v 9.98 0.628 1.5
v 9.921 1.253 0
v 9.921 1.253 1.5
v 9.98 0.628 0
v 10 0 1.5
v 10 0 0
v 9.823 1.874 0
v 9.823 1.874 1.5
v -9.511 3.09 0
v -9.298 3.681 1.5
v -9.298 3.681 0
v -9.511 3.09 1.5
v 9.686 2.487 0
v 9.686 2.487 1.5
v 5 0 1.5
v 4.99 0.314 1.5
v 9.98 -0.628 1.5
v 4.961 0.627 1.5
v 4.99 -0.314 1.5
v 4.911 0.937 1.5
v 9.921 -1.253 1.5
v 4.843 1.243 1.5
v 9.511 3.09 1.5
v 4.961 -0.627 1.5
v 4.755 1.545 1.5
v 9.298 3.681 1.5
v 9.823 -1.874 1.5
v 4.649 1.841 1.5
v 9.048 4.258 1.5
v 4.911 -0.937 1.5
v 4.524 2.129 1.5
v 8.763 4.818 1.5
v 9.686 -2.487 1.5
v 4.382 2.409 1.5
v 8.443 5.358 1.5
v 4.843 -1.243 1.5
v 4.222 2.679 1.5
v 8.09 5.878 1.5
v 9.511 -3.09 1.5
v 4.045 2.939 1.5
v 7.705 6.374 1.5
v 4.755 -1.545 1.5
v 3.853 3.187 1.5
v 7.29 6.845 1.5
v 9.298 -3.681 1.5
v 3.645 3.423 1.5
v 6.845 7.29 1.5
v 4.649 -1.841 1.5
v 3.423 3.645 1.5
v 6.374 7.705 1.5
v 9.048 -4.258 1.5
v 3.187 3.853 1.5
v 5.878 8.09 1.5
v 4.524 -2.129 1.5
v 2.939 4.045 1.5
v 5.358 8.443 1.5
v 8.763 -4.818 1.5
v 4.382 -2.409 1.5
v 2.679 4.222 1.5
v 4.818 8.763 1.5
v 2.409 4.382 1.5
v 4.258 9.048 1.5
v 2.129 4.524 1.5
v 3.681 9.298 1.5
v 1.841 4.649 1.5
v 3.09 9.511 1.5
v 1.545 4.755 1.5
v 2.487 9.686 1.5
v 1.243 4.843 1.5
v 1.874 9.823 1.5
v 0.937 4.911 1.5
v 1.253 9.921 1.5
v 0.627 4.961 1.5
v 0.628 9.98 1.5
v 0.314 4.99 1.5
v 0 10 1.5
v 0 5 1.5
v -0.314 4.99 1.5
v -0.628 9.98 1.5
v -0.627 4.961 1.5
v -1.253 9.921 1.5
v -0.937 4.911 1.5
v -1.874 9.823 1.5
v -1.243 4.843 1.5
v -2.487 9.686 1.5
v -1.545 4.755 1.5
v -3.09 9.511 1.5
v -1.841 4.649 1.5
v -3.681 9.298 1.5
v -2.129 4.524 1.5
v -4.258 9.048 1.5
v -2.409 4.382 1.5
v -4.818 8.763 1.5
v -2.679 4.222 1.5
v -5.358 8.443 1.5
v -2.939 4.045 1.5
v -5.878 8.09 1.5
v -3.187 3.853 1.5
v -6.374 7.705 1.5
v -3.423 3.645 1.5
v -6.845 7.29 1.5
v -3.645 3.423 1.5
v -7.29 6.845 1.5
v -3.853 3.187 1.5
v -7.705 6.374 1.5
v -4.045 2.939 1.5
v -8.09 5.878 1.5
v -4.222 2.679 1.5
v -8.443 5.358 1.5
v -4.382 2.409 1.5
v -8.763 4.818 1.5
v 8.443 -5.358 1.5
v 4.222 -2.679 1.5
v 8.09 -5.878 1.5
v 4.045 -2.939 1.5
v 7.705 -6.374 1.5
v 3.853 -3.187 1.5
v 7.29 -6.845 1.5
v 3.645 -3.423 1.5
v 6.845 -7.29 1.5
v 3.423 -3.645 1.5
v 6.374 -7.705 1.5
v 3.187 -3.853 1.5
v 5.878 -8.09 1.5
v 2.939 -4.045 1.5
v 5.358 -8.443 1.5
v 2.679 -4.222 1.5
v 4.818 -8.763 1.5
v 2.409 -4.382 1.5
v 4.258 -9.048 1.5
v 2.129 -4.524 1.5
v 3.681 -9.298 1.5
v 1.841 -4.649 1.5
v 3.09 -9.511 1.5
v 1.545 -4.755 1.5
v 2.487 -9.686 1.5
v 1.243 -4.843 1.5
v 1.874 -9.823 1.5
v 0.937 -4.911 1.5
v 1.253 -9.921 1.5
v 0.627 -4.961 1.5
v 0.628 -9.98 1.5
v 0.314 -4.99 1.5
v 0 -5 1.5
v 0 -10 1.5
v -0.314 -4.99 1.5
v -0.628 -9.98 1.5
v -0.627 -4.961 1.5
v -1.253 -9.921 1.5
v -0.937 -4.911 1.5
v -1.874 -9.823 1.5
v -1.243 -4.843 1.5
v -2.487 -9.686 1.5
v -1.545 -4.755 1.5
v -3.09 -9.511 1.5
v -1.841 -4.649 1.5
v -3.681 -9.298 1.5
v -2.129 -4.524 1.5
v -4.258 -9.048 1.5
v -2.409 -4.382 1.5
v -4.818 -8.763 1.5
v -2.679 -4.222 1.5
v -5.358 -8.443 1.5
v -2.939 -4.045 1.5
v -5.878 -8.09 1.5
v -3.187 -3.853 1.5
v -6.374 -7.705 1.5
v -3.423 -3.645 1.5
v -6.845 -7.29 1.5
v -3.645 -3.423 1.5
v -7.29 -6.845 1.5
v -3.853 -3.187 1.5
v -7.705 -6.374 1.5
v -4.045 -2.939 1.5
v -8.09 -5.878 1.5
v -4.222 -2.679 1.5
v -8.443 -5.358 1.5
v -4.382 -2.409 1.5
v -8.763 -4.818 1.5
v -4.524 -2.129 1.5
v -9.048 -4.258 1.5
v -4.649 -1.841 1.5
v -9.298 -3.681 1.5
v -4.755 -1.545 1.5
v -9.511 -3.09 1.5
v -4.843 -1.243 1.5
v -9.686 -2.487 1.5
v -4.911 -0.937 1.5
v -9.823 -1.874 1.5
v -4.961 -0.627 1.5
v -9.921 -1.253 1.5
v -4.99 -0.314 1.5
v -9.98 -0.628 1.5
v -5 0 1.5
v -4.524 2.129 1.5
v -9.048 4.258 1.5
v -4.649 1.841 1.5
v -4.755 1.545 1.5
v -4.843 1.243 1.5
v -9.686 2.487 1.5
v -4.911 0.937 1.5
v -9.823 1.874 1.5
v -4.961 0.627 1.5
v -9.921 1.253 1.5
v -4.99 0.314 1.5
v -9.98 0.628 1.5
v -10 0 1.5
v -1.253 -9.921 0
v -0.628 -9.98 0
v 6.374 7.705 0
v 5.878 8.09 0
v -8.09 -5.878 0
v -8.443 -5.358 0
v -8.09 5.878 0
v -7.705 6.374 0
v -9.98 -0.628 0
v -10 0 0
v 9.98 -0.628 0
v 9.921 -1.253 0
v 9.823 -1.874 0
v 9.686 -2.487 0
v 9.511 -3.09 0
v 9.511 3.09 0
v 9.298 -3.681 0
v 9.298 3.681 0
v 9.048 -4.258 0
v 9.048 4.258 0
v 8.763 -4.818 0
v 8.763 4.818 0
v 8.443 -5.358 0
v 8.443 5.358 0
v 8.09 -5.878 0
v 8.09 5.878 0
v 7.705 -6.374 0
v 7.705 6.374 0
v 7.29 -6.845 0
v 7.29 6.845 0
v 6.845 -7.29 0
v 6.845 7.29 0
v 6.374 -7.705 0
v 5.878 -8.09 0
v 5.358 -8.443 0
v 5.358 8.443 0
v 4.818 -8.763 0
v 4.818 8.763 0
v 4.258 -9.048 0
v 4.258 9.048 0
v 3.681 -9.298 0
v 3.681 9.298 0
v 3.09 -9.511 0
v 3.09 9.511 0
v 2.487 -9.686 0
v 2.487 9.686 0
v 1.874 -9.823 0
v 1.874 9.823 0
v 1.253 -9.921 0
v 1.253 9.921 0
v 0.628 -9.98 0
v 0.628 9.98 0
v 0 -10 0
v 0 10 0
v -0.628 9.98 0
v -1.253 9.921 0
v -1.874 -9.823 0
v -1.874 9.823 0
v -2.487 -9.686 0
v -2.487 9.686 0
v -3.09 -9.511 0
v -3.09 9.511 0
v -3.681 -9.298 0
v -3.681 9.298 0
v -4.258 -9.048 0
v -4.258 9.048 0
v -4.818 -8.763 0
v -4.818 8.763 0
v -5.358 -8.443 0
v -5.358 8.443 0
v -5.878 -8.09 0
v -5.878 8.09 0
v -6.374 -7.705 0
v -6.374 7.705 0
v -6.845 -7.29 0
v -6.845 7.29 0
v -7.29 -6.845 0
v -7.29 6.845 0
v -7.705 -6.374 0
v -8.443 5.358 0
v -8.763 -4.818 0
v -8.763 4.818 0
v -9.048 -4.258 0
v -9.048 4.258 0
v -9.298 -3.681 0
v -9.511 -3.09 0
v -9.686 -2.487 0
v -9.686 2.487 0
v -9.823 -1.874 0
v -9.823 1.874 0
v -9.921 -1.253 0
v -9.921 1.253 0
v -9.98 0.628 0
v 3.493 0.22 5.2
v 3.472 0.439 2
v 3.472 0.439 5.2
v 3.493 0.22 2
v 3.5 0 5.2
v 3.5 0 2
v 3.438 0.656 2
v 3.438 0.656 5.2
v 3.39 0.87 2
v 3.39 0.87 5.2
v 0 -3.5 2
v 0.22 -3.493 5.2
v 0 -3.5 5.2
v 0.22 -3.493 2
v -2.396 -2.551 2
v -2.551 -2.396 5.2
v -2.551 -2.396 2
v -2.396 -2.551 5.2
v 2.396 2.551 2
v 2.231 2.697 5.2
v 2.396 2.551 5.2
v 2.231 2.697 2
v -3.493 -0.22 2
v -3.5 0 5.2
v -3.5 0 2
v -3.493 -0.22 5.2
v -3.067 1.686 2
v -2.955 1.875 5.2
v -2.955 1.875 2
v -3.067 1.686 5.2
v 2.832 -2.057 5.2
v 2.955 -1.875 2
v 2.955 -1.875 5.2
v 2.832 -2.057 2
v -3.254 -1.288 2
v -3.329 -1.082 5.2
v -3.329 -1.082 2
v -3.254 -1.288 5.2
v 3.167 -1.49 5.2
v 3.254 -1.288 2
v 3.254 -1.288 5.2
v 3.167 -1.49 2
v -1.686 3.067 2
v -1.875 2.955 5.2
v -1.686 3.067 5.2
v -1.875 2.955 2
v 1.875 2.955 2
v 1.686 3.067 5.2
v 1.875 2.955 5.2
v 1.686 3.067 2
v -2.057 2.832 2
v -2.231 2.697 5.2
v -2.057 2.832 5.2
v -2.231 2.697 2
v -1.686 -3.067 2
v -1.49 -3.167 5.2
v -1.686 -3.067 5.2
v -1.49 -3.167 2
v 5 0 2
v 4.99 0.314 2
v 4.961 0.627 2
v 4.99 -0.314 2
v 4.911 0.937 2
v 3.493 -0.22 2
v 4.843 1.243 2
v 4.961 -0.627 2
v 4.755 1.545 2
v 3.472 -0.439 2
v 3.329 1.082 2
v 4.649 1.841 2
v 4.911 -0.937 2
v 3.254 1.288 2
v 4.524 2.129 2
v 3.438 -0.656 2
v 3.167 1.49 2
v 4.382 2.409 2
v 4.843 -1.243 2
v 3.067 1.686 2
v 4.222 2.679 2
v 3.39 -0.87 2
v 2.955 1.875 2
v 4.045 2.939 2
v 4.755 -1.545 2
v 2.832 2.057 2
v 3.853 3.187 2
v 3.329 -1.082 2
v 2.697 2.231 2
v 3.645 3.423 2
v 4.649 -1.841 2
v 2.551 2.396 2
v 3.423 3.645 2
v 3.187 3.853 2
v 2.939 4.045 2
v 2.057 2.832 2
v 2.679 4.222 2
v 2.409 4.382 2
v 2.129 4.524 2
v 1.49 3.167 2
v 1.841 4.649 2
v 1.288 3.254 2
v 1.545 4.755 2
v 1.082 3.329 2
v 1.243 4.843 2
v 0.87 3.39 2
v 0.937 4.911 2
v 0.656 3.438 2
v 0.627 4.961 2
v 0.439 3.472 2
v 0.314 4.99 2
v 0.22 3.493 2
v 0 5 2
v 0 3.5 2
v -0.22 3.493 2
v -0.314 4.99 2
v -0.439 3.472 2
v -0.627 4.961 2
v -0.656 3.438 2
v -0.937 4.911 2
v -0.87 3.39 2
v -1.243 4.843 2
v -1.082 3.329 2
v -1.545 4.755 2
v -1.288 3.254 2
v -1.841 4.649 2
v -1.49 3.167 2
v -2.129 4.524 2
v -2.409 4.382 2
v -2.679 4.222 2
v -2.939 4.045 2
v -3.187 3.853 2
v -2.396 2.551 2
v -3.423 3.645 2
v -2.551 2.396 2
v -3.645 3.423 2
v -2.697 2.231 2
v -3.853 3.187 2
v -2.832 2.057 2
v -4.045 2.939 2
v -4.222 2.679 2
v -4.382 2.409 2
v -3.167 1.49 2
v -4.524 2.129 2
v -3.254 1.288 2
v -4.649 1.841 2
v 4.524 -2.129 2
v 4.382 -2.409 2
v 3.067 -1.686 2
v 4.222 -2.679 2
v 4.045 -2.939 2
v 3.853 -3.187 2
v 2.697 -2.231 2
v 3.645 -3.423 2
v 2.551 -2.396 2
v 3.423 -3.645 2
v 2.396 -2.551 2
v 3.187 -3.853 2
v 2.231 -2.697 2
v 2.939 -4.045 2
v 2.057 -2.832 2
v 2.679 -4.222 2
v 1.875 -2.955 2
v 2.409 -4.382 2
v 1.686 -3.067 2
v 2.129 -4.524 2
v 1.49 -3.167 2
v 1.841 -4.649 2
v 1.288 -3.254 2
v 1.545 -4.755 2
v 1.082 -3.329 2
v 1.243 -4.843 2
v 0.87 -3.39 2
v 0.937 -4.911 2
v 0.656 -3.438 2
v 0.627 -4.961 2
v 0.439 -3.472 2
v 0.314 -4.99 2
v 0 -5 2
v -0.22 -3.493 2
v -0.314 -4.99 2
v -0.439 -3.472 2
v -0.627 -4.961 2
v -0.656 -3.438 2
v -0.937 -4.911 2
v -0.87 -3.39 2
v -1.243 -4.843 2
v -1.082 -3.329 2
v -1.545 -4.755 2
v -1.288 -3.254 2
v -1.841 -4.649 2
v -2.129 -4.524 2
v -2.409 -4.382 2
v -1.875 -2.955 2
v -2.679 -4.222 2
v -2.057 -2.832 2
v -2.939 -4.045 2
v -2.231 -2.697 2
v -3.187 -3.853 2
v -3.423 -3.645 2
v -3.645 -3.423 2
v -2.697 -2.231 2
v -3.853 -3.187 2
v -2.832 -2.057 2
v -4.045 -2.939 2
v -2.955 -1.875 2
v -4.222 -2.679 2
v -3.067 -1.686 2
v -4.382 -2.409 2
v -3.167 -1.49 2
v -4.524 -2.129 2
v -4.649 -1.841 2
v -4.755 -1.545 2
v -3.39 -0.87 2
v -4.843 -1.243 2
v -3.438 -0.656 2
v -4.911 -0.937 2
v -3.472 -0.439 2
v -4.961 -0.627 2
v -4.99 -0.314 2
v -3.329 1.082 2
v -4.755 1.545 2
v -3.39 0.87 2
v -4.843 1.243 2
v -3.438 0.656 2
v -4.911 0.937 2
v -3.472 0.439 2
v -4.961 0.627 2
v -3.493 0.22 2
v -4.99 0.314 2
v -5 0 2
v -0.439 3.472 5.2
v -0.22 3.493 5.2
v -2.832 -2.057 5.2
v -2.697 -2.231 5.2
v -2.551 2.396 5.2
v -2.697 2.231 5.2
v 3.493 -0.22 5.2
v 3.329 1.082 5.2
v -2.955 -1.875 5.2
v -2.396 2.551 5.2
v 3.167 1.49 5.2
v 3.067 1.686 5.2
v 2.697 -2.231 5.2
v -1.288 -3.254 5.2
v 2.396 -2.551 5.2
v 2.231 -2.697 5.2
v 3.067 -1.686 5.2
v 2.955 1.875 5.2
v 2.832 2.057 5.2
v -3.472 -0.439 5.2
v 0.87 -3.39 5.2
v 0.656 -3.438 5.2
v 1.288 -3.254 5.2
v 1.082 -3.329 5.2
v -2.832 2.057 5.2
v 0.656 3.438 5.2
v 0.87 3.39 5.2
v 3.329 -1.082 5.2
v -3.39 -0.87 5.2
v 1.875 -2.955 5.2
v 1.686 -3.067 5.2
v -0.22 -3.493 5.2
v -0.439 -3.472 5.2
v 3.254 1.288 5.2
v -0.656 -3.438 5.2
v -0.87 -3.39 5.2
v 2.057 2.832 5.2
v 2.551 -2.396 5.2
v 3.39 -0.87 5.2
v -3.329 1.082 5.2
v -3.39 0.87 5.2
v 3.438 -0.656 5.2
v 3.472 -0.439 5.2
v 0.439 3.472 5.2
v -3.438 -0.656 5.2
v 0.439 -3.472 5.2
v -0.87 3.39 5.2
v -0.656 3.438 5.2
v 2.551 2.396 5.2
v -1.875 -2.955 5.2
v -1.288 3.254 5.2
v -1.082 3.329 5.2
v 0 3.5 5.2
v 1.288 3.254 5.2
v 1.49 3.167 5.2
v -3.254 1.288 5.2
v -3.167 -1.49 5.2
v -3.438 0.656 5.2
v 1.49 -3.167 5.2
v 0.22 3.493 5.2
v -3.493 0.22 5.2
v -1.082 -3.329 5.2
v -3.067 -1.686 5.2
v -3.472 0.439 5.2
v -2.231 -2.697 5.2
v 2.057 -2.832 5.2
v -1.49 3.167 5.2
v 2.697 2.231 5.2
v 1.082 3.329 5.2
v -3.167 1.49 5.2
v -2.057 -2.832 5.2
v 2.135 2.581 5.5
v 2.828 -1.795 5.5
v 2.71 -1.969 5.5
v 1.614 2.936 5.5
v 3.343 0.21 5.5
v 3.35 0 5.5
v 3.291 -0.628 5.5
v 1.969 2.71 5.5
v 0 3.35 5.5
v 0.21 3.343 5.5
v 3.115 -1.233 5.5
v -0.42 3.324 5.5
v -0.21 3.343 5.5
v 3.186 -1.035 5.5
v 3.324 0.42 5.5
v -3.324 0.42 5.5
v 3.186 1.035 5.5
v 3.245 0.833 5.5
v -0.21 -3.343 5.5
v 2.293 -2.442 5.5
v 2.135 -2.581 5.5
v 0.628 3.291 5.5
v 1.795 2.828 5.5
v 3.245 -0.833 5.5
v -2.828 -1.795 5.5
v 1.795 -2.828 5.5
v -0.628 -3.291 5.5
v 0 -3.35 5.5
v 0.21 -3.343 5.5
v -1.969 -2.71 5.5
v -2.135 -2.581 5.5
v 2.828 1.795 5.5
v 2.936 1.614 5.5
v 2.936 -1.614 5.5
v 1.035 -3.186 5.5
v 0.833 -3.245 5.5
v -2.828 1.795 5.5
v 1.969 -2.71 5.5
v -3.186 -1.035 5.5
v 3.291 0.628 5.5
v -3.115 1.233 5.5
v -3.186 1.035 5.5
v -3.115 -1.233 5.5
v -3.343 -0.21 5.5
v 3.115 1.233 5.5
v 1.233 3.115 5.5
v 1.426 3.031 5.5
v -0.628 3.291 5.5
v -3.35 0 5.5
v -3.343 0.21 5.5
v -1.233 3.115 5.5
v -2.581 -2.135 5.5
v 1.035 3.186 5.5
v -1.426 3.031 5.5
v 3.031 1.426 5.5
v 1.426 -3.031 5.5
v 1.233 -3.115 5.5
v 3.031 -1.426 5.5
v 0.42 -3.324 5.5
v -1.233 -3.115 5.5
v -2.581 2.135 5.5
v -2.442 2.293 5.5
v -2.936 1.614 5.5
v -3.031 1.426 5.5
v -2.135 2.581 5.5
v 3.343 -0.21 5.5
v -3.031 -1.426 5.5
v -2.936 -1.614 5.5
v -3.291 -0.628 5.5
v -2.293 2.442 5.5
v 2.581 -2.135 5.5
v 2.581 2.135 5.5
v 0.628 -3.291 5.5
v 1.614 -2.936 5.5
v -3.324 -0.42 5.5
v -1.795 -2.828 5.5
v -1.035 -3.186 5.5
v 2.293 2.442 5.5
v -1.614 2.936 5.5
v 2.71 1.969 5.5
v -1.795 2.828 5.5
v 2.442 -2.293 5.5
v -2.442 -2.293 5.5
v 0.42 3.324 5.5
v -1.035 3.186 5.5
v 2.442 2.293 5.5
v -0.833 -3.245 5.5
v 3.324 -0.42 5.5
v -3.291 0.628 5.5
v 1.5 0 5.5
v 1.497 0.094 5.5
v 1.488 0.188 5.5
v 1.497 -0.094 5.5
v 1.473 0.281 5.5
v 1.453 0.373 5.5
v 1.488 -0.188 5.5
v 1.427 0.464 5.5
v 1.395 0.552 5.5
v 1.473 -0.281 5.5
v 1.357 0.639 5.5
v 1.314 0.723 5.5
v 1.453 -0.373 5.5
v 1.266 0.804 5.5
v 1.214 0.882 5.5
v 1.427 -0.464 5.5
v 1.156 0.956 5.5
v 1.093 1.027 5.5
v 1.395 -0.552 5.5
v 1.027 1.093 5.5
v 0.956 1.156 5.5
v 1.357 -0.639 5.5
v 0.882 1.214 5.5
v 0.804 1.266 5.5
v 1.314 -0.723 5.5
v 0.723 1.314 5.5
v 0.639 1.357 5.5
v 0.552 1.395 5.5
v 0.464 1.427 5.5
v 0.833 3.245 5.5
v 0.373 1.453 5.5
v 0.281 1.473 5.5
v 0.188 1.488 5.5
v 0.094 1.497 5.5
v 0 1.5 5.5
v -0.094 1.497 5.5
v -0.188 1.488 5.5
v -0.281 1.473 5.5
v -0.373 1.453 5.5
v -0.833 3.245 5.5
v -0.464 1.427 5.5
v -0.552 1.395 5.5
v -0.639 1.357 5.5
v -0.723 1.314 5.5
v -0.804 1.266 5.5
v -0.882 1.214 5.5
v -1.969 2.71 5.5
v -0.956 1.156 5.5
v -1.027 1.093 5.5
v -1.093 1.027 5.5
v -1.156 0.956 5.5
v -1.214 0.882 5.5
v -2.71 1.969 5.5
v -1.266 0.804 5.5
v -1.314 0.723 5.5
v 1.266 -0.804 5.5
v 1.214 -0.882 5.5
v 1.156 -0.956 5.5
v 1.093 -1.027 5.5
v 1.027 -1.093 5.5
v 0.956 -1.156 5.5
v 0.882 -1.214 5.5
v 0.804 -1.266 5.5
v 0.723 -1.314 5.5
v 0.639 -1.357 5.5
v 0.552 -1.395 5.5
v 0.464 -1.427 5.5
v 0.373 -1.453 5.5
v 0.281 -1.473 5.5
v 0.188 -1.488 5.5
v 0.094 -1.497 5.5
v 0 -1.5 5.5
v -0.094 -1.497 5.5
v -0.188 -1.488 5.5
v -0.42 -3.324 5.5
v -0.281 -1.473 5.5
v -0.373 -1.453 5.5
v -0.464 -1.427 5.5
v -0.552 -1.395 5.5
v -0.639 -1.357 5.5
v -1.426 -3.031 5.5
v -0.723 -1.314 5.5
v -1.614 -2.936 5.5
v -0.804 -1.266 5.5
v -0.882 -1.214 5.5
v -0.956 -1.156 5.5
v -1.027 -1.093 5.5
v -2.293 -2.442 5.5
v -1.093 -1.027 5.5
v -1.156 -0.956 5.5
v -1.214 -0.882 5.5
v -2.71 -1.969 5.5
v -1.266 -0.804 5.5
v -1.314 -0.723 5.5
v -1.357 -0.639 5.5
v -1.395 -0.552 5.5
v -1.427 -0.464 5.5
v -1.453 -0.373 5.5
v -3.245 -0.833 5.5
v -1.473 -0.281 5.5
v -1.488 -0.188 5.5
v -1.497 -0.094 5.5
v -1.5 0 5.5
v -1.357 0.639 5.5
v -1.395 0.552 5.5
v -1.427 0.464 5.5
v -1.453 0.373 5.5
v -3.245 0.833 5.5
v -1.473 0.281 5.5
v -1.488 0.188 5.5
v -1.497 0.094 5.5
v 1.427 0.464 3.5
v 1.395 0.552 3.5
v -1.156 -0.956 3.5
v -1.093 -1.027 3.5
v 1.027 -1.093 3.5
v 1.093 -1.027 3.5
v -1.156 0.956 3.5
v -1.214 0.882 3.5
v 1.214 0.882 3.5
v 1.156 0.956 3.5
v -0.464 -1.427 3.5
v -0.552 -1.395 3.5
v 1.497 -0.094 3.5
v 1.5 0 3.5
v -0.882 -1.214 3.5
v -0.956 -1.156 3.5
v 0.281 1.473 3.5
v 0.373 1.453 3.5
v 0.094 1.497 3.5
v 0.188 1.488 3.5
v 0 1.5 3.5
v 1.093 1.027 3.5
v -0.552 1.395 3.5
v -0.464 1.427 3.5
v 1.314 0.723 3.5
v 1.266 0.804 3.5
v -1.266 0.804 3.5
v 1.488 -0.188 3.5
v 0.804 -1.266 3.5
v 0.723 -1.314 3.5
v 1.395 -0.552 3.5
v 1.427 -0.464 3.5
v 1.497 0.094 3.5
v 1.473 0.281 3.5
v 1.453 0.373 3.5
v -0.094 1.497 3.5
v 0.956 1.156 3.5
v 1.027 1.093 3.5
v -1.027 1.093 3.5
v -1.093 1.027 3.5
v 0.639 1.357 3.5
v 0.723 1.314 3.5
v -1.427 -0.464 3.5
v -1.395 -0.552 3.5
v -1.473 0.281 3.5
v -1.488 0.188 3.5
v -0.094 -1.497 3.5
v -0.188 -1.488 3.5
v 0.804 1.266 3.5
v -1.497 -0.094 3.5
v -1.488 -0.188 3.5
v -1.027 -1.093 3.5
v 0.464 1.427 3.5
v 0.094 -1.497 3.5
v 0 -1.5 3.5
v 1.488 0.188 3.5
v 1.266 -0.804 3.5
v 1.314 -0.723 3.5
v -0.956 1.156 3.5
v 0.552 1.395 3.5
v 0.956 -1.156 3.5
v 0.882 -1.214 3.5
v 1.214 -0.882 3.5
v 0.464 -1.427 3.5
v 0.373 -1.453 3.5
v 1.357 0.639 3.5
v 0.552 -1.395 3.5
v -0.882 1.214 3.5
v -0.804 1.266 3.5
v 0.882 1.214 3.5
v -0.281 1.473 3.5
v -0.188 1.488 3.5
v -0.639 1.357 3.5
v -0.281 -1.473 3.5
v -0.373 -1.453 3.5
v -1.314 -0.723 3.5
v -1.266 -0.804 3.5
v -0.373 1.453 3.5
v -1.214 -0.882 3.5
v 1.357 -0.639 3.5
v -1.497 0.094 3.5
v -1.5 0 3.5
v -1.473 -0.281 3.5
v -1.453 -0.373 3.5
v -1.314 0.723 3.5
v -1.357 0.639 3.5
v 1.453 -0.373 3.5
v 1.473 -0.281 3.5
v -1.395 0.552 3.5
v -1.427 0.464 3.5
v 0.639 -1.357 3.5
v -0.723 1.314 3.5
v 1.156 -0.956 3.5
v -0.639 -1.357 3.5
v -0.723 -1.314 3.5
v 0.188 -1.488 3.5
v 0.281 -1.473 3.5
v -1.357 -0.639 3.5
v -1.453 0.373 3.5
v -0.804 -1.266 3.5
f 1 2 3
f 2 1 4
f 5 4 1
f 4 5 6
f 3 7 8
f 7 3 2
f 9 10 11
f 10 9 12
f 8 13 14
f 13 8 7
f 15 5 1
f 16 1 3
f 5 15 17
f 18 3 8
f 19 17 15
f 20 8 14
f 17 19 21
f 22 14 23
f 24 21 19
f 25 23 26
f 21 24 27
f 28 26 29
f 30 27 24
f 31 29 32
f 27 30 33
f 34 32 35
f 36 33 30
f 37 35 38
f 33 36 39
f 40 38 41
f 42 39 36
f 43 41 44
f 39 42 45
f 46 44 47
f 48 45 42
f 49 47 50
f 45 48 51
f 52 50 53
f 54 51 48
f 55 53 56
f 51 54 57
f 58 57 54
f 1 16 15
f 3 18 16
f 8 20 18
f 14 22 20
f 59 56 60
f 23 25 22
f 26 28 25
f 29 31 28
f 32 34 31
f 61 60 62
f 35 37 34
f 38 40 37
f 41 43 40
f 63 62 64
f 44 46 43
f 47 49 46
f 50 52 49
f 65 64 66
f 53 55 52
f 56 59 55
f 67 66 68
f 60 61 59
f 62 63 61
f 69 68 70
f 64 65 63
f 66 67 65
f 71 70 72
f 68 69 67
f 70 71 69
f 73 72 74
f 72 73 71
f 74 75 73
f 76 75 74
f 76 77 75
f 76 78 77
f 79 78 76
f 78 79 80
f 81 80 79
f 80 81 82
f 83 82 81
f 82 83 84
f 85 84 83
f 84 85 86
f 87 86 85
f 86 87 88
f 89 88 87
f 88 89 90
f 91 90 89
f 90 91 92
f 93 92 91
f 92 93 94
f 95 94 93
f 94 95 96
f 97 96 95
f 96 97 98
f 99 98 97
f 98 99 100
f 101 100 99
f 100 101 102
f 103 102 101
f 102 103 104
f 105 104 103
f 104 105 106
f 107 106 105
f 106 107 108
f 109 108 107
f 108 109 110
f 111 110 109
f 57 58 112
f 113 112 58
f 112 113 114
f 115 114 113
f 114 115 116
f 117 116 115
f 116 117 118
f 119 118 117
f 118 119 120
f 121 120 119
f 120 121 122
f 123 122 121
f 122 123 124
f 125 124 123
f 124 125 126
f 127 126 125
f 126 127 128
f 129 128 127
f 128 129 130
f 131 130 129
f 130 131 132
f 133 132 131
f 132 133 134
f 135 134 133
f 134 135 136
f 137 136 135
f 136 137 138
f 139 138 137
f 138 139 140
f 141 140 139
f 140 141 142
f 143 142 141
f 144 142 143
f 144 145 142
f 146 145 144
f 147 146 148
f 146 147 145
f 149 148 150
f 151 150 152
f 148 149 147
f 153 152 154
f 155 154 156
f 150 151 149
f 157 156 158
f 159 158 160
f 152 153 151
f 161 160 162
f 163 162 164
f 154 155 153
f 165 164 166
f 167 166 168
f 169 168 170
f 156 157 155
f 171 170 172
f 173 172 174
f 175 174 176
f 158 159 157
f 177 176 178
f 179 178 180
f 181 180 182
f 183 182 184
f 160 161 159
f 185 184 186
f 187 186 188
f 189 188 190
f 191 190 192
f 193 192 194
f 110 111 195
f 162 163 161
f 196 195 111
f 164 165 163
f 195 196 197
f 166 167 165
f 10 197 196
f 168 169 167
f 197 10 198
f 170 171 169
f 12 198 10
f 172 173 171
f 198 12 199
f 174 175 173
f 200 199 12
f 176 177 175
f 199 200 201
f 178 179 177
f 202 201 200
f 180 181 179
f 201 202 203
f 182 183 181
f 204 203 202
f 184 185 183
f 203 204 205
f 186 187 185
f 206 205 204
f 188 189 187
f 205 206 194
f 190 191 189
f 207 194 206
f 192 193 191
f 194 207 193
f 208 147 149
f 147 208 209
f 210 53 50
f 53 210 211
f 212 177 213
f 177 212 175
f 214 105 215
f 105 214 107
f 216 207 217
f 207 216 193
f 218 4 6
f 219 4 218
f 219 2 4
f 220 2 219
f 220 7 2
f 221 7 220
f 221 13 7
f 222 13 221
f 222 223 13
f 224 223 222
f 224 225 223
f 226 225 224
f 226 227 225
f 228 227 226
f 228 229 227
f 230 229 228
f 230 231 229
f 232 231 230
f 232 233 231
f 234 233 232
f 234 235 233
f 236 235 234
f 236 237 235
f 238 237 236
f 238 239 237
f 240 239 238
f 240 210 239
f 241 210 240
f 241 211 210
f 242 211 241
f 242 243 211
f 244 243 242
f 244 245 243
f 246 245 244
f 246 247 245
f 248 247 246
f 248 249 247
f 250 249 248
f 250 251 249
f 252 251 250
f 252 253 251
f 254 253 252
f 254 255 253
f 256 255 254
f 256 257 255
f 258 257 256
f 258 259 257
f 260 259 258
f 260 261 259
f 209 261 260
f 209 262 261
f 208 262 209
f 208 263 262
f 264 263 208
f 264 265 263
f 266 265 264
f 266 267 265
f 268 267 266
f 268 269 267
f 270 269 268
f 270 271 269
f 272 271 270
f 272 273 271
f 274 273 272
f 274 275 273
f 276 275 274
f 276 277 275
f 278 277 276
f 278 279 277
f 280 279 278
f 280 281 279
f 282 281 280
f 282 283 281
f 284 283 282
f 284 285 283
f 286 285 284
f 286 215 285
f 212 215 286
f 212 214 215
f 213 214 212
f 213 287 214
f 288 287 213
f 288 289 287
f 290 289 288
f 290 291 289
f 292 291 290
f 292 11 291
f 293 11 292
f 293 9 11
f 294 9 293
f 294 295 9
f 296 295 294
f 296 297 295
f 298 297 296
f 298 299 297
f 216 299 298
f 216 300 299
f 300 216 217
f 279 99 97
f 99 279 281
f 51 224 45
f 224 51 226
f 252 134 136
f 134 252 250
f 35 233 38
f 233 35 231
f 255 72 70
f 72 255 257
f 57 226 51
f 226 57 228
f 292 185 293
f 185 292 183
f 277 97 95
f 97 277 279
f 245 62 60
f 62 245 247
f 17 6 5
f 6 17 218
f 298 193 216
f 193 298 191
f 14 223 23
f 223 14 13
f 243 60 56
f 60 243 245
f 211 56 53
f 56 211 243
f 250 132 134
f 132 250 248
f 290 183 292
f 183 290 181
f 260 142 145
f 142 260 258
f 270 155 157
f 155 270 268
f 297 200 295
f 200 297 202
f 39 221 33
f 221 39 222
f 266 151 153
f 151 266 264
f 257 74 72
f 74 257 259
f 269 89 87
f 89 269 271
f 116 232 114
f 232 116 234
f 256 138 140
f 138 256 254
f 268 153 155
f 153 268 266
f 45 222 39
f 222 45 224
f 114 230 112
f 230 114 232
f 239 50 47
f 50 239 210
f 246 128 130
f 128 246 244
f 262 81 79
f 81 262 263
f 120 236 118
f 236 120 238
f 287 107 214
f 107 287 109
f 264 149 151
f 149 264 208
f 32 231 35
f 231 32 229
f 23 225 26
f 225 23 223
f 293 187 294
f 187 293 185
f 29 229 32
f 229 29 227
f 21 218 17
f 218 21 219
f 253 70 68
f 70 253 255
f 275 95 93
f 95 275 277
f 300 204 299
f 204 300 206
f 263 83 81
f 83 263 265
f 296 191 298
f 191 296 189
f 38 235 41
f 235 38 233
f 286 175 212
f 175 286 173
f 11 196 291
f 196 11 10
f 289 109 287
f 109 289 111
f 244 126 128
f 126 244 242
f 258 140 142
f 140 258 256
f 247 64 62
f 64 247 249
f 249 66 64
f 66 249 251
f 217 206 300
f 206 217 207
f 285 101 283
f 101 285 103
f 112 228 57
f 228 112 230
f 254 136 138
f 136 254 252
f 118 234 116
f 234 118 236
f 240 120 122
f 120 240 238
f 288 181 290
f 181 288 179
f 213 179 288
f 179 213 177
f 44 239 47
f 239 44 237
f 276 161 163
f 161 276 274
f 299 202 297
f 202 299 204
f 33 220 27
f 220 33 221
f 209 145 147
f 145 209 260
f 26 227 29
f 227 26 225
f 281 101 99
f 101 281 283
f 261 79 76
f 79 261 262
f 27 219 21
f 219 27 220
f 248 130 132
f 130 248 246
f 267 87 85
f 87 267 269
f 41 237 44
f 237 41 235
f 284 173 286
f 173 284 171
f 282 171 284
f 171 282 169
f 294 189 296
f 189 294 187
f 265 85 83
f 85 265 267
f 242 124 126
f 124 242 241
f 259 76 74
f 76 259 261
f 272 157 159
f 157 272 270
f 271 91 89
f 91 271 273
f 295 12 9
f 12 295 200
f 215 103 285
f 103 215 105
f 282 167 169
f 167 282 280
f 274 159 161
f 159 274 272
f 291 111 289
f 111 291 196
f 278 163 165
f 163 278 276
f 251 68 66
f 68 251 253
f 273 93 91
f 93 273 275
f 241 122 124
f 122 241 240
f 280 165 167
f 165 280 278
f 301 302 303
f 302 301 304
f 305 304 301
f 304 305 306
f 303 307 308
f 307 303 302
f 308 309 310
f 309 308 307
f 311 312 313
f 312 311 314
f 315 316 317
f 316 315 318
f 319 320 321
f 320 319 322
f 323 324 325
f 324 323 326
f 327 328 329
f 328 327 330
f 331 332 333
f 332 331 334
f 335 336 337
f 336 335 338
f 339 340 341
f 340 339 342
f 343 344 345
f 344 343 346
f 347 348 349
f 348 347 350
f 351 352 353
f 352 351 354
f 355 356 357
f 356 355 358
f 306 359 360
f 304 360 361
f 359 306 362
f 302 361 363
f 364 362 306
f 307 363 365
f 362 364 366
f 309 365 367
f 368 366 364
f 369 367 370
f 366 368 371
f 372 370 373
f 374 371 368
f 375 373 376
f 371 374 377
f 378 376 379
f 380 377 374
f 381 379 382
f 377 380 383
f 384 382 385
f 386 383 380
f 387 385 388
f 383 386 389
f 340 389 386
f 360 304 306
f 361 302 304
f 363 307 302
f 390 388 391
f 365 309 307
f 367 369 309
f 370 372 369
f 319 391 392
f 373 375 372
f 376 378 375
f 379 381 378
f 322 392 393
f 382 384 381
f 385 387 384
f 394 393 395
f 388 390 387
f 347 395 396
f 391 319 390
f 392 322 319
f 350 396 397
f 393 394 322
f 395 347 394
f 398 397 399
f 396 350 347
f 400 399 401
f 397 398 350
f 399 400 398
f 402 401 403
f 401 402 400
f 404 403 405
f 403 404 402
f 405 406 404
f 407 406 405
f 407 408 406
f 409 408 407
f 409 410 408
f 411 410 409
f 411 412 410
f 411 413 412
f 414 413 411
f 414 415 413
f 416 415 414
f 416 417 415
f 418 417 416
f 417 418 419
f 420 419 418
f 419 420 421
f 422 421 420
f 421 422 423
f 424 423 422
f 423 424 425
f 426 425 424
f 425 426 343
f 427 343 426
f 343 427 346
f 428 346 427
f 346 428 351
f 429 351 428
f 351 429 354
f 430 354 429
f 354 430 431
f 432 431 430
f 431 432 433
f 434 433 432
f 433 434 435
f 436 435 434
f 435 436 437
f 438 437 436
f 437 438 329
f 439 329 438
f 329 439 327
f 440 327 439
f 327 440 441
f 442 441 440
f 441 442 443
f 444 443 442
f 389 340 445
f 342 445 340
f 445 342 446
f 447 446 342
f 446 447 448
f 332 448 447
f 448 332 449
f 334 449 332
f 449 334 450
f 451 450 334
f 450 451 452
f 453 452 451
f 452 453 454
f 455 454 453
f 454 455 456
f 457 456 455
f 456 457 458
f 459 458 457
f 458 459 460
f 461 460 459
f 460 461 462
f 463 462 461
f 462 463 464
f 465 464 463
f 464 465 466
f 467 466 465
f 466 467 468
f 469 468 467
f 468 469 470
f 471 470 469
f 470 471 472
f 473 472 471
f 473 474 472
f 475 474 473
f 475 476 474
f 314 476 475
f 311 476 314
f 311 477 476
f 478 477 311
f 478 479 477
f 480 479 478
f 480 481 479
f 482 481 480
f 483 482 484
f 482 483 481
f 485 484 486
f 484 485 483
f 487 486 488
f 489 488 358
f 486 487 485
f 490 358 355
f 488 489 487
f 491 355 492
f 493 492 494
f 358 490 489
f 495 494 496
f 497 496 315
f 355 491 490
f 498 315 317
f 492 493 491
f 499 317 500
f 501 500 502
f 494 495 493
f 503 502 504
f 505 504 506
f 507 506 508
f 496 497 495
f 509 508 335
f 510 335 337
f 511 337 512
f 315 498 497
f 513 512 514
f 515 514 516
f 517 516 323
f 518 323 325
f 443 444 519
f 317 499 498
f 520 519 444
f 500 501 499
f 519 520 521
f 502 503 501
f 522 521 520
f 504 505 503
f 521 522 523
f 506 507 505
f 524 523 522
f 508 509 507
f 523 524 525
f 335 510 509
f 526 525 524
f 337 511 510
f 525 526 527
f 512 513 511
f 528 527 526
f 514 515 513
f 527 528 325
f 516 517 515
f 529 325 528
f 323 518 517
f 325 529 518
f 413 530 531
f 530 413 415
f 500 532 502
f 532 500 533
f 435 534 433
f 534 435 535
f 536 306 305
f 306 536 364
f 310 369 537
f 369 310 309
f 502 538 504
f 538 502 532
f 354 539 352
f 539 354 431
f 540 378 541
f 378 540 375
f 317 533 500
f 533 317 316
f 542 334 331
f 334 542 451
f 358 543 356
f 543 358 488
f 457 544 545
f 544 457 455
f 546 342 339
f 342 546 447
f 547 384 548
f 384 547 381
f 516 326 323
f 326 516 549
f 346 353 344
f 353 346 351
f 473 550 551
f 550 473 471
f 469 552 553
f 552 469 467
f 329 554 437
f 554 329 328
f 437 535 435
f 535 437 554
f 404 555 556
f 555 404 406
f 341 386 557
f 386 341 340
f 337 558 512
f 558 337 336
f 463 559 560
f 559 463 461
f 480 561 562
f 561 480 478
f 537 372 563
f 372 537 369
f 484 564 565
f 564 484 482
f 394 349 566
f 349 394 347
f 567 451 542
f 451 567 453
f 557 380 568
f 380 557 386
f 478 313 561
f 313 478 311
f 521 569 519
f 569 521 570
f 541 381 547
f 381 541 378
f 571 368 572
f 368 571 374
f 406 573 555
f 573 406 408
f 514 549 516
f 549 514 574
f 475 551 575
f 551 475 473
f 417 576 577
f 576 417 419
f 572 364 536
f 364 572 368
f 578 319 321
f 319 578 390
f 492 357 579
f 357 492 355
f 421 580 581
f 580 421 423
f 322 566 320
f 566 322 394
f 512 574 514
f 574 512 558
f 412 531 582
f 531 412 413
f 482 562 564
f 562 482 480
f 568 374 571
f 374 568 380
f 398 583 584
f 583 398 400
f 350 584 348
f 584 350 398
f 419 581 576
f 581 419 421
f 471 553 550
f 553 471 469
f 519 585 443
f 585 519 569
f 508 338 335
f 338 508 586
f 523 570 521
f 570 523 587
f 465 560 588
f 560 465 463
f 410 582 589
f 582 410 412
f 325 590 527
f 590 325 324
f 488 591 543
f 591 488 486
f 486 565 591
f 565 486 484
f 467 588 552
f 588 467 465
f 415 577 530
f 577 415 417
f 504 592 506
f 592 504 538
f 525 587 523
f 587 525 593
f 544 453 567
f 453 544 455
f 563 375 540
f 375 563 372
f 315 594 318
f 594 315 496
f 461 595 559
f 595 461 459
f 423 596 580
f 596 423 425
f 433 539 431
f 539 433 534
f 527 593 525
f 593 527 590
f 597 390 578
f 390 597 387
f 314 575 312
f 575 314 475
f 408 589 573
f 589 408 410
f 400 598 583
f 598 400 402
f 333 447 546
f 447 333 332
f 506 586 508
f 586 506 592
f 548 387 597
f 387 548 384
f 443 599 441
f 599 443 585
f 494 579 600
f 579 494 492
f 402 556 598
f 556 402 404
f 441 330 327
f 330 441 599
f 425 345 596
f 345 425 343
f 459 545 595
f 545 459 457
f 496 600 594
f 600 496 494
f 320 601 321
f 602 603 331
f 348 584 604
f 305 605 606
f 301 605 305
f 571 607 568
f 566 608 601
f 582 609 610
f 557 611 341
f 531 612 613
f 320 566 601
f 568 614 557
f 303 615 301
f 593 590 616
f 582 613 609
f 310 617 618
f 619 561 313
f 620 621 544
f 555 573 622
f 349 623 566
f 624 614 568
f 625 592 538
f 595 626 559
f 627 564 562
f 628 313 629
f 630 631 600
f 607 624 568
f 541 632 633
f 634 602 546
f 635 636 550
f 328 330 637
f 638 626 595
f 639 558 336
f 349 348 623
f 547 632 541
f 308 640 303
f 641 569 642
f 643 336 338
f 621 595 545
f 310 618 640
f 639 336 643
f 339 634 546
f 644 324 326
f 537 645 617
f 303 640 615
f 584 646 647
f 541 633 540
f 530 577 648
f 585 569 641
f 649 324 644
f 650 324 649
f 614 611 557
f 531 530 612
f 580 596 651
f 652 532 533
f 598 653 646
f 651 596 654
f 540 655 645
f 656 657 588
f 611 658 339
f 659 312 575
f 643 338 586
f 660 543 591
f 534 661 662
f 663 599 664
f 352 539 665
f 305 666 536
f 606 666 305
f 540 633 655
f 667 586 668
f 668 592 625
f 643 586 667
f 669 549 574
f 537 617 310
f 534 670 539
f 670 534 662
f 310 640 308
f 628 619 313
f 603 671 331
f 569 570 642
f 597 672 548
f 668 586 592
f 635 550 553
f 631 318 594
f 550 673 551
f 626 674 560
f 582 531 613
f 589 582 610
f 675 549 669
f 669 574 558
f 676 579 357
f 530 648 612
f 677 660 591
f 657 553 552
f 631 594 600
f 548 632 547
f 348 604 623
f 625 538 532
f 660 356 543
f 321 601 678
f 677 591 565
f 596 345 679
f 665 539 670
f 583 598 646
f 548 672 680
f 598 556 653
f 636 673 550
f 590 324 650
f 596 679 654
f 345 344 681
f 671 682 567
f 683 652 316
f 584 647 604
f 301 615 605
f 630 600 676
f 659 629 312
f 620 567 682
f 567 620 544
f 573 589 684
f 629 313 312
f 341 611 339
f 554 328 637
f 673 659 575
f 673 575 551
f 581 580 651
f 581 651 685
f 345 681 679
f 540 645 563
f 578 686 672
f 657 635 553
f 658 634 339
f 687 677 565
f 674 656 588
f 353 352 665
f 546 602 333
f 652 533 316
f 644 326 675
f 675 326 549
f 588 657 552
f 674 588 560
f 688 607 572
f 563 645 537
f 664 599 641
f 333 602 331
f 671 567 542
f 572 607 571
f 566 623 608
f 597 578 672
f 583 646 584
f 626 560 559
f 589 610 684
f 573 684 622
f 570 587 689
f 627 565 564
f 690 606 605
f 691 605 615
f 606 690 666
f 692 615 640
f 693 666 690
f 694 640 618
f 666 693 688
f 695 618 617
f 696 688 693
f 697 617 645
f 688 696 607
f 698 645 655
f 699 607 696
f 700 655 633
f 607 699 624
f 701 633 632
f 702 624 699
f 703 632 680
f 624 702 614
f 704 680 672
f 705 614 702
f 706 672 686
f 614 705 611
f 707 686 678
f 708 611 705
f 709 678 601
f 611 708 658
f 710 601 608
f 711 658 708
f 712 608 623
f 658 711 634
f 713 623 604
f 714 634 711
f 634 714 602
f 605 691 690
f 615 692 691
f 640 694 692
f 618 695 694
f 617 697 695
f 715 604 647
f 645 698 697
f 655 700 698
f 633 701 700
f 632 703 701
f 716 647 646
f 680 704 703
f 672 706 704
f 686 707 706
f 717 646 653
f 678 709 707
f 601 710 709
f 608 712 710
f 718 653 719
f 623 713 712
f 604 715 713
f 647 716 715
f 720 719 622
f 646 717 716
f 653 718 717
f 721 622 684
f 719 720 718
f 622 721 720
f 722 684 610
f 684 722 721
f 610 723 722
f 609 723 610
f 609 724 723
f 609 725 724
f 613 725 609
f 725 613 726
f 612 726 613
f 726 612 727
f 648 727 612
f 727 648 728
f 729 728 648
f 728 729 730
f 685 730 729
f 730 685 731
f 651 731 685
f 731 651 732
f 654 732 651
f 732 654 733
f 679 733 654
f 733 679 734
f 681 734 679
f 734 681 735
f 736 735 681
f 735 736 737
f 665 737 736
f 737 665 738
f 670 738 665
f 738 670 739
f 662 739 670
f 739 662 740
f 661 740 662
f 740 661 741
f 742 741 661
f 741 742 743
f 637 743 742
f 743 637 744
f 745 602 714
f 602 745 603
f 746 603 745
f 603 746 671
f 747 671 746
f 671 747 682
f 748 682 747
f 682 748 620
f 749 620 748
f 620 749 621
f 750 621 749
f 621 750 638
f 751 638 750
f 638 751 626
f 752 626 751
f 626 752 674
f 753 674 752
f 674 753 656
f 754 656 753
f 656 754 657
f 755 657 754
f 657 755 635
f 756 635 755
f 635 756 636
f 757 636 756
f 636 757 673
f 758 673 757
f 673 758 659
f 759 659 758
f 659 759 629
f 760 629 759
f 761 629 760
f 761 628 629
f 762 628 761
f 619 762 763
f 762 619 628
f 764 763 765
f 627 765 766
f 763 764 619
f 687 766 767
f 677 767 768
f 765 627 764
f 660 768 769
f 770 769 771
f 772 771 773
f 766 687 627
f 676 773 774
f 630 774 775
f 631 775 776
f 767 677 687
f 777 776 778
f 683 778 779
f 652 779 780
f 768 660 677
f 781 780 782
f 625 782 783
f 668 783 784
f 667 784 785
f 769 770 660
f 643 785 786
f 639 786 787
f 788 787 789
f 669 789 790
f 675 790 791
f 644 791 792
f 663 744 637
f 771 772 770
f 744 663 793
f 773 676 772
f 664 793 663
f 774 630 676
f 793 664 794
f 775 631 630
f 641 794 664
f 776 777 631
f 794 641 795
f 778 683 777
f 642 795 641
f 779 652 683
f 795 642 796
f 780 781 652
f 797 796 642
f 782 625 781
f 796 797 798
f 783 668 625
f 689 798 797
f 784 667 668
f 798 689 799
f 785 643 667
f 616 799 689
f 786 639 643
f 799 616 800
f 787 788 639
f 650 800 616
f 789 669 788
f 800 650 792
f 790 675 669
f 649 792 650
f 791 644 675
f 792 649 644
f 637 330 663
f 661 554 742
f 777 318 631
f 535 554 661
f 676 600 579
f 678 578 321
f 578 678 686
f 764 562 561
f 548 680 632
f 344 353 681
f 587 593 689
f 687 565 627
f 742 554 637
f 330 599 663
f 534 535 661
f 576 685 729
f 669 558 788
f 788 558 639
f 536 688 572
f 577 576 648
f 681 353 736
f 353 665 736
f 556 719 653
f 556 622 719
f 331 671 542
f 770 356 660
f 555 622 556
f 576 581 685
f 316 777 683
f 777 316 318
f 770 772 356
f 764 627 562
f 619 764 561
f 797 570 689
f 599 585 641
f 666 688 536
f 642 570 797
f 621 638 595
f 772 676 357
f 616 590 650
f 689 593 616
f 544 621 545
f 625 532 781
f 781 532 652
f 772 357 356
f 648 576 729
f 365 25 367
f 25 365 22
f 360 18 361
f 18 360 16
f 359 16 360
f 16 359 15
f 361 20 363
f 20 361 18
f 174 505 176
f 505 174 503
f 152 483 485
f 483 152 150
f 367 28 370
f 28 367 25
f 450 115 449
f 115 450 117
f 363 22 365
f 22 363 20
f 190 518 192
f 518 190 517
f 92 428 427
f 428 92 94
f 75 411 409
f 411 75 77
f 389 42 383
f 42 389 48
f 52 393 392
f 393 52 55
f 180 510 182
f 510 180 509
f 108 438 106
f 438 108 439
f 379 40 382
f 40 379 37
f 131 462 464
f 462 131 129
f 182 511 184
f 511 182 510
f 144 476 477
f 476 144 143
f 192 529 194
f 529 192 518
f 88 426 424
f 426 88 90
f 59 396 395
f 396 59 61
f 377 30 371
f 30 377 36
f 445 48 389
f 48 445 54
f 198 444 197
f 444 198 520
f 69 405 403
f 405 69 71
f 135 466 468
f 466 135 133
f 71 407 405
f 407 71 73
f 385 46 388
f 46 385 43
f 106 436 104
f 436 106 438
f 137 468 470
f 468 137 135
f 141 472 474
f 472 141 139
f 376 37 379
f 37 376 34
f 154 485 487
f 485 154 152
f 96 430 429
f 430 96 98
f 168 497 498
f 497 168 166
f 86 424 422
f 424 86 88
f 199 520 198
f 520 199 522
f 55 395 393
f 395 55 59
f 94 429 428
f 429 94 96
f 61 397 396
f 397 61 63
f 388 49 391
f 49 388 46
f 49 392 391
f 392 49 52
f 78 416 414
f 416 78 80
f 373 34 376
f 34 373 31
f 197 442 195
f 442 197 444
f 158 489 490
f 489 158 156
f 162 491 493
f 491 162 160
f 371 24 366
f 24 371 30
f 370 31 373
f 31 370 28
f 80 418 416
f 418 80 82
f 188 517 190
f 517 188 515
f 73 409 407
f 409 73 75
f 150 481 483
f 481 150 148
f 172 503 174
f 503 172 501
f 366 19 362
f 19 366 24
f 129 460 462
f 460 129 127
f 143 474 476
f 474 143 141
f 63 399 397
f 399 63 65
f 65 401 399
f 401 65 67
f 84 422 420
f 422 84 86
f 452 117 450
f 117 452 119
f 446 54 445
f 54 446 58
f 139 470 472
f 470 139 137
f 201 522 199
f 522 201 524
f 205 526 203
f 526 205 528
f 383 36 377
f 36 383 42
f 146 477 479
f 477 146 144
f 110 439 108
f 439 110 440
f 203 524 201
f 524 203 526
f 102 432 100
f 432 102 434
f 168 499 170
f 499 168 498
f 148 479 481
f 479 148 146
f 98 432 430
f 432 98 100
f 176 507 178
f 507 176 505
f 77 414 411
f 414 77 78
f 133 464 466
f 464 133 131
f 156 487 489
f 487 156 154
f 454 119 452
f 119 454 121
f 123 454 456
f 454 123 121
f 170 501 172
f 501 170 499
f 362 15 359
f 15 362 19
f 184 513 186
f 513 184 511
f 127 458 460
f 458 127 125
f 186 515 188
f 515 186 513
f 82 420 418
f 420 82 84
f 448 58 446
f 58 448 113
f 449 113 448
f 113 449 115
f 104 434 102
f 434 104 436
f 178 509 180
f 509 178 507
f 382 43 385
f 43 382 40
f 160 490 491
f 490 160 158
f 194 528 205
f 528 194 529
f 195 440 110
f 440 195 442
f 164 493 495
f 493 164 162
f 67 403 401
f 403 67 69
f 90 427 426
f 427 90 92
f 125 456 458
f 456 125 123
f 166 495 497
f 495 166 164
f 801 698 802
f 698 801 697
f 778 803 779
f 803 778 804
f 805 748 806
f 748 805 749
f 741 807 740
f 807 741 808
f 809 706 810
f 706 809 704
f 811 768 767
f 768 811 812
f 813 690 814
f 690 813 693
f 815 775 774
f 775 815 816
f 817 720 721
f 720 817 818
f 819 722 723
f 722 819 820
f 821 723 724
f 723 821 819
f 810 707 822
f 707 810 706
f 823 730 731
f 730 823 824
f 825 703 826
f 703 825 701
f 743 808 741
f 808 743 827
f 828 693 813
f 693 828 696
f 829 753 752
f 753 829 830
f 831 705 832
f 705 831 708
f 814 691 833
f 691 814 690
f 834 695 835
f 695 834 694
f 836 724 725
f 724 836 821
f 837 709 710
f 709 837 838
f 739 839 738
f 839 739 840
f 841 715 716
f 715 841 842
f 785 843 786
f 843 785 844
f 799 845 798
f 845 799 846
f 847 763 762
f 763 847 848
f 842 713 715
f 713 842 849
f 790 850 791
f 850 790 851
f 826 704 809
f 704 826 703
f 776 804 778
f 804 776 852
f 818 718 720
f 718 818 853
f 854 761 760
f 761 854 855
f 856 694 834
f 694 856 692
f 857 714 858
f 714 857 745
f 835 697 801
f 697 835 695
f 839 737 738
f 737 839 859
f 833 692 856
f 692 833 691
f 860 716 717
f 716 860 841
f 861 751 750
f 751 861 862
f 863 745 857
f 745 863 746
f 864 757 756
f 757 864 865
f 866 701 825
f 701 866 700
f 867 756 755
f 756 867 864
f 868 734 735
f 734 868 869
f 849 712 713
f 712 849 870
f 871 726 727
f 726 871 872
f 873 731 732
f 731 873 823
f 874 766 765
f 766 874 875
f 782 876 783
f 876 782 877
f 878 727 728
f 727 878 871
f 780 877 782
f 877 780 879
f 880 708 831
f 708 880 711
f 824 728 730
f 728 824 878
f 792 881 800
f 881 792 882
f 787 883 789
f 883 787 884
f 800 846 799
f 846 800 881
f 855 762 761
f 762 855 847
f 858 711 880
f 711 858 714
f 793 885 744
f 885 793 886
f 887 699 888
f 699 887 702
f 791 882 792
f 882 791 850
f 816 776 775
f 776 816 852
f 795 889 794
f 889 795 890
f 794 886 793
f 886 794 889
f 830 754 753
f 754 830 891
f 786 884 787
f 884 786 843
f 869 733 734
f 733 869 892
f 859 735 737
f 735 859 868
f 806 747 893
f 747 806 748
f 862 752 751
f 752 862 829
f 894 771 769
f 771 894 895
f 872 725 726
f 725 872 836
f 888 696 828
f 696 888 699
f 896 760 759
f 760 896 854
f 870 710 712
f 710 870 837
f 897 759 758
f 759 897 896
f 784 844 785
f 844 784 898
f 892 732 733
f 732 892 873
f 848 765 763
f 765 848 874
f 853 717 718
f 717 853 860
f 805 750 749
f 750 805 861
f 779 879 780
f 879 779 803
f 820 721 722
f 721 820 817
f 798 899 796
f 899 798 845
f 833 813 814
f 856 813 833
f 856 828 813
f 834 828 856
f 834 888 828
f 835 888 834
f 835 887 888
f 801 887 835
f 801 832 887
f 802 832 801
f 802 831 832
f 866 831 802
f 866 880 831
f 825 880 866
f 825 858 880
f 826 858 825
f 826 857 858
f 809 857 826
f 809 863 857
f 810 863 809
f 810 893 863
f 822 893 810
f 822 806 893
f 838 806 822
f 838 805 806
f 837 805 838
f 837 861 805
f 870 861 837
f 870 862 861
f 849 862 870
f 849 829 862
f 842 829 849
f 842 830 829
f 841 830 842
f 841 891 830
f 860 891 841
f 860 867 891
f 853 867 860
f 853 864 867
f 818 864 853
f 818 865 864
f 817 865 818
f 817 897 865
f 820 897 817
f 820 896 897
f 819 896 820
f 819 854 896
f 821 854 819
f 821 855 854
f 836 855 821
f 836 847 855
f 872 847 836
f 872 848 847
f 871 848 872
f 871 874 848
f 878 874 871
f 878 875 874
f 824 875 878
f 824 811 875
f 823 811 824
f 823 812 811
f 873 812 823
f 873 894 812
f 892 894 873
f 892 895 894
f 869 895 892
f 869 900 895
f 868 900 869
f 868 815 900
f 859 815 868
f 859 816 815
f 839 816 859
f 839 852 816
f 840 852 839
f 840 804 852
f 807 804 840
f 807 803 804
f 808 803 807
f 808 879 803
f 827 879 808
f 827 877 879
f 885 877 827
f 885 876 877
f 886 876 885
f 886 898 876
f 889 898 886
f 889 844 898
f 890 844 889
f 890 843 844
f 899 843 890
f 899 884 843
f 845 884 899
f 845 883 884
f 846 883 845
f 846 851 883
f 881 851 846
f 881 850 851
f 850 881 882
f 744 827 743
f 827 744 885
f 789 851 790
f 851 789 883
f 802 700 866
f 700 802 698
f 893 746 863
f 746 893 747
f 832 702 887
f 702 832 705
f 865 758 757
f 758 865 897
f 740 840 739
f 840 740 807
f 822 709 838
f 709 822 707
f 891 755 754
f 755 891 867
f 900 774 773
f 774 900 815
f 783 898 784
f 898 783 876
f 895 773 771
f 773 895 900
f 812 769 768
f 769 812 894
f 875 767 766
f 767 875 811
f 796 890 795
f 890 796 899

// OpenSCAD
/*
    Author:Kevin Lutzer
    Date: Oct 19 2016
    Description: replacement peace for a finger spinner 
*/


/////////////////////////////////////// Parameters //////////////////////////////////////////

disk_diameter = 20;
disk_thickness = 1.5;

bearing_depth = 7; 
inner_bearing_diameter = 7; 
outer_bearing_diameter = 10;
bearing_seperation = 0.5;

bevel_height = 0.3; 

screw_diameter = 3;
screw_head_height = 2;
screw_head_diameter = 4;
screw_length = 5;

total_thickness = disk_thickness + bearing_depth;
/////////////////////////////////////// protoypes ////////////////////////////////////////////
bottom_disk();

/////////////////////////////////////// Modules /////////////////////////////////////////////

module disk_blank(){
    union(){
        cylinder(disk_thickness, d1=disk_diameter, d2=disk_diameter, $fn=100 );
        translate([0,0,disk_thickness+bearing_seperation]){
            cylinder(bearing_depth/2-bevel_height, d1=inner_bearing_diameter, d2=inner_bearing_diameter, $fn=100 );   
        }
        translate([0,0,disk_thickness+bearing_depth/2-bevel_height+bearing_seperation]){
            cylinder(bevel_height, d1=inner_bearing_diameter, d2=inner_bearing_diameter-bevel_height, $fn=100 );
        }
        translate([0,0,disk_thickness]){
                cylinder(bearing_seperation, d1=outer_bearing_diameter, d2 =outer_bearing_diameter, $fn=100 );
        }
    }
}

module top_disk(){
    difference(){
        disk_blank();
        cylinder(screw_head_height, d1 = screw_head_diameter, d2 = screw_head_diameter, $fn=100 );
        translate([0,0,0]){
            cylinder(screw_head_height, d1 = screw_head_diameter, d2 = screw_head_diameter, $fn=100);
        }
        translate([0,0,screw_head_height]){
            cylinder( screw_length, d1 = screw_diameter, d2 = screw_diameter, $fn = 100);
        }
    }
}

module bottom_disk(){
    difference(){
        disk_blank();
        translate([0,0,total_thickness - screw_length]){    
            cylinder( screw_length, d1 = screw_diameter, d2 = screw_diameter, $fn = 100);
        }
    }
}
